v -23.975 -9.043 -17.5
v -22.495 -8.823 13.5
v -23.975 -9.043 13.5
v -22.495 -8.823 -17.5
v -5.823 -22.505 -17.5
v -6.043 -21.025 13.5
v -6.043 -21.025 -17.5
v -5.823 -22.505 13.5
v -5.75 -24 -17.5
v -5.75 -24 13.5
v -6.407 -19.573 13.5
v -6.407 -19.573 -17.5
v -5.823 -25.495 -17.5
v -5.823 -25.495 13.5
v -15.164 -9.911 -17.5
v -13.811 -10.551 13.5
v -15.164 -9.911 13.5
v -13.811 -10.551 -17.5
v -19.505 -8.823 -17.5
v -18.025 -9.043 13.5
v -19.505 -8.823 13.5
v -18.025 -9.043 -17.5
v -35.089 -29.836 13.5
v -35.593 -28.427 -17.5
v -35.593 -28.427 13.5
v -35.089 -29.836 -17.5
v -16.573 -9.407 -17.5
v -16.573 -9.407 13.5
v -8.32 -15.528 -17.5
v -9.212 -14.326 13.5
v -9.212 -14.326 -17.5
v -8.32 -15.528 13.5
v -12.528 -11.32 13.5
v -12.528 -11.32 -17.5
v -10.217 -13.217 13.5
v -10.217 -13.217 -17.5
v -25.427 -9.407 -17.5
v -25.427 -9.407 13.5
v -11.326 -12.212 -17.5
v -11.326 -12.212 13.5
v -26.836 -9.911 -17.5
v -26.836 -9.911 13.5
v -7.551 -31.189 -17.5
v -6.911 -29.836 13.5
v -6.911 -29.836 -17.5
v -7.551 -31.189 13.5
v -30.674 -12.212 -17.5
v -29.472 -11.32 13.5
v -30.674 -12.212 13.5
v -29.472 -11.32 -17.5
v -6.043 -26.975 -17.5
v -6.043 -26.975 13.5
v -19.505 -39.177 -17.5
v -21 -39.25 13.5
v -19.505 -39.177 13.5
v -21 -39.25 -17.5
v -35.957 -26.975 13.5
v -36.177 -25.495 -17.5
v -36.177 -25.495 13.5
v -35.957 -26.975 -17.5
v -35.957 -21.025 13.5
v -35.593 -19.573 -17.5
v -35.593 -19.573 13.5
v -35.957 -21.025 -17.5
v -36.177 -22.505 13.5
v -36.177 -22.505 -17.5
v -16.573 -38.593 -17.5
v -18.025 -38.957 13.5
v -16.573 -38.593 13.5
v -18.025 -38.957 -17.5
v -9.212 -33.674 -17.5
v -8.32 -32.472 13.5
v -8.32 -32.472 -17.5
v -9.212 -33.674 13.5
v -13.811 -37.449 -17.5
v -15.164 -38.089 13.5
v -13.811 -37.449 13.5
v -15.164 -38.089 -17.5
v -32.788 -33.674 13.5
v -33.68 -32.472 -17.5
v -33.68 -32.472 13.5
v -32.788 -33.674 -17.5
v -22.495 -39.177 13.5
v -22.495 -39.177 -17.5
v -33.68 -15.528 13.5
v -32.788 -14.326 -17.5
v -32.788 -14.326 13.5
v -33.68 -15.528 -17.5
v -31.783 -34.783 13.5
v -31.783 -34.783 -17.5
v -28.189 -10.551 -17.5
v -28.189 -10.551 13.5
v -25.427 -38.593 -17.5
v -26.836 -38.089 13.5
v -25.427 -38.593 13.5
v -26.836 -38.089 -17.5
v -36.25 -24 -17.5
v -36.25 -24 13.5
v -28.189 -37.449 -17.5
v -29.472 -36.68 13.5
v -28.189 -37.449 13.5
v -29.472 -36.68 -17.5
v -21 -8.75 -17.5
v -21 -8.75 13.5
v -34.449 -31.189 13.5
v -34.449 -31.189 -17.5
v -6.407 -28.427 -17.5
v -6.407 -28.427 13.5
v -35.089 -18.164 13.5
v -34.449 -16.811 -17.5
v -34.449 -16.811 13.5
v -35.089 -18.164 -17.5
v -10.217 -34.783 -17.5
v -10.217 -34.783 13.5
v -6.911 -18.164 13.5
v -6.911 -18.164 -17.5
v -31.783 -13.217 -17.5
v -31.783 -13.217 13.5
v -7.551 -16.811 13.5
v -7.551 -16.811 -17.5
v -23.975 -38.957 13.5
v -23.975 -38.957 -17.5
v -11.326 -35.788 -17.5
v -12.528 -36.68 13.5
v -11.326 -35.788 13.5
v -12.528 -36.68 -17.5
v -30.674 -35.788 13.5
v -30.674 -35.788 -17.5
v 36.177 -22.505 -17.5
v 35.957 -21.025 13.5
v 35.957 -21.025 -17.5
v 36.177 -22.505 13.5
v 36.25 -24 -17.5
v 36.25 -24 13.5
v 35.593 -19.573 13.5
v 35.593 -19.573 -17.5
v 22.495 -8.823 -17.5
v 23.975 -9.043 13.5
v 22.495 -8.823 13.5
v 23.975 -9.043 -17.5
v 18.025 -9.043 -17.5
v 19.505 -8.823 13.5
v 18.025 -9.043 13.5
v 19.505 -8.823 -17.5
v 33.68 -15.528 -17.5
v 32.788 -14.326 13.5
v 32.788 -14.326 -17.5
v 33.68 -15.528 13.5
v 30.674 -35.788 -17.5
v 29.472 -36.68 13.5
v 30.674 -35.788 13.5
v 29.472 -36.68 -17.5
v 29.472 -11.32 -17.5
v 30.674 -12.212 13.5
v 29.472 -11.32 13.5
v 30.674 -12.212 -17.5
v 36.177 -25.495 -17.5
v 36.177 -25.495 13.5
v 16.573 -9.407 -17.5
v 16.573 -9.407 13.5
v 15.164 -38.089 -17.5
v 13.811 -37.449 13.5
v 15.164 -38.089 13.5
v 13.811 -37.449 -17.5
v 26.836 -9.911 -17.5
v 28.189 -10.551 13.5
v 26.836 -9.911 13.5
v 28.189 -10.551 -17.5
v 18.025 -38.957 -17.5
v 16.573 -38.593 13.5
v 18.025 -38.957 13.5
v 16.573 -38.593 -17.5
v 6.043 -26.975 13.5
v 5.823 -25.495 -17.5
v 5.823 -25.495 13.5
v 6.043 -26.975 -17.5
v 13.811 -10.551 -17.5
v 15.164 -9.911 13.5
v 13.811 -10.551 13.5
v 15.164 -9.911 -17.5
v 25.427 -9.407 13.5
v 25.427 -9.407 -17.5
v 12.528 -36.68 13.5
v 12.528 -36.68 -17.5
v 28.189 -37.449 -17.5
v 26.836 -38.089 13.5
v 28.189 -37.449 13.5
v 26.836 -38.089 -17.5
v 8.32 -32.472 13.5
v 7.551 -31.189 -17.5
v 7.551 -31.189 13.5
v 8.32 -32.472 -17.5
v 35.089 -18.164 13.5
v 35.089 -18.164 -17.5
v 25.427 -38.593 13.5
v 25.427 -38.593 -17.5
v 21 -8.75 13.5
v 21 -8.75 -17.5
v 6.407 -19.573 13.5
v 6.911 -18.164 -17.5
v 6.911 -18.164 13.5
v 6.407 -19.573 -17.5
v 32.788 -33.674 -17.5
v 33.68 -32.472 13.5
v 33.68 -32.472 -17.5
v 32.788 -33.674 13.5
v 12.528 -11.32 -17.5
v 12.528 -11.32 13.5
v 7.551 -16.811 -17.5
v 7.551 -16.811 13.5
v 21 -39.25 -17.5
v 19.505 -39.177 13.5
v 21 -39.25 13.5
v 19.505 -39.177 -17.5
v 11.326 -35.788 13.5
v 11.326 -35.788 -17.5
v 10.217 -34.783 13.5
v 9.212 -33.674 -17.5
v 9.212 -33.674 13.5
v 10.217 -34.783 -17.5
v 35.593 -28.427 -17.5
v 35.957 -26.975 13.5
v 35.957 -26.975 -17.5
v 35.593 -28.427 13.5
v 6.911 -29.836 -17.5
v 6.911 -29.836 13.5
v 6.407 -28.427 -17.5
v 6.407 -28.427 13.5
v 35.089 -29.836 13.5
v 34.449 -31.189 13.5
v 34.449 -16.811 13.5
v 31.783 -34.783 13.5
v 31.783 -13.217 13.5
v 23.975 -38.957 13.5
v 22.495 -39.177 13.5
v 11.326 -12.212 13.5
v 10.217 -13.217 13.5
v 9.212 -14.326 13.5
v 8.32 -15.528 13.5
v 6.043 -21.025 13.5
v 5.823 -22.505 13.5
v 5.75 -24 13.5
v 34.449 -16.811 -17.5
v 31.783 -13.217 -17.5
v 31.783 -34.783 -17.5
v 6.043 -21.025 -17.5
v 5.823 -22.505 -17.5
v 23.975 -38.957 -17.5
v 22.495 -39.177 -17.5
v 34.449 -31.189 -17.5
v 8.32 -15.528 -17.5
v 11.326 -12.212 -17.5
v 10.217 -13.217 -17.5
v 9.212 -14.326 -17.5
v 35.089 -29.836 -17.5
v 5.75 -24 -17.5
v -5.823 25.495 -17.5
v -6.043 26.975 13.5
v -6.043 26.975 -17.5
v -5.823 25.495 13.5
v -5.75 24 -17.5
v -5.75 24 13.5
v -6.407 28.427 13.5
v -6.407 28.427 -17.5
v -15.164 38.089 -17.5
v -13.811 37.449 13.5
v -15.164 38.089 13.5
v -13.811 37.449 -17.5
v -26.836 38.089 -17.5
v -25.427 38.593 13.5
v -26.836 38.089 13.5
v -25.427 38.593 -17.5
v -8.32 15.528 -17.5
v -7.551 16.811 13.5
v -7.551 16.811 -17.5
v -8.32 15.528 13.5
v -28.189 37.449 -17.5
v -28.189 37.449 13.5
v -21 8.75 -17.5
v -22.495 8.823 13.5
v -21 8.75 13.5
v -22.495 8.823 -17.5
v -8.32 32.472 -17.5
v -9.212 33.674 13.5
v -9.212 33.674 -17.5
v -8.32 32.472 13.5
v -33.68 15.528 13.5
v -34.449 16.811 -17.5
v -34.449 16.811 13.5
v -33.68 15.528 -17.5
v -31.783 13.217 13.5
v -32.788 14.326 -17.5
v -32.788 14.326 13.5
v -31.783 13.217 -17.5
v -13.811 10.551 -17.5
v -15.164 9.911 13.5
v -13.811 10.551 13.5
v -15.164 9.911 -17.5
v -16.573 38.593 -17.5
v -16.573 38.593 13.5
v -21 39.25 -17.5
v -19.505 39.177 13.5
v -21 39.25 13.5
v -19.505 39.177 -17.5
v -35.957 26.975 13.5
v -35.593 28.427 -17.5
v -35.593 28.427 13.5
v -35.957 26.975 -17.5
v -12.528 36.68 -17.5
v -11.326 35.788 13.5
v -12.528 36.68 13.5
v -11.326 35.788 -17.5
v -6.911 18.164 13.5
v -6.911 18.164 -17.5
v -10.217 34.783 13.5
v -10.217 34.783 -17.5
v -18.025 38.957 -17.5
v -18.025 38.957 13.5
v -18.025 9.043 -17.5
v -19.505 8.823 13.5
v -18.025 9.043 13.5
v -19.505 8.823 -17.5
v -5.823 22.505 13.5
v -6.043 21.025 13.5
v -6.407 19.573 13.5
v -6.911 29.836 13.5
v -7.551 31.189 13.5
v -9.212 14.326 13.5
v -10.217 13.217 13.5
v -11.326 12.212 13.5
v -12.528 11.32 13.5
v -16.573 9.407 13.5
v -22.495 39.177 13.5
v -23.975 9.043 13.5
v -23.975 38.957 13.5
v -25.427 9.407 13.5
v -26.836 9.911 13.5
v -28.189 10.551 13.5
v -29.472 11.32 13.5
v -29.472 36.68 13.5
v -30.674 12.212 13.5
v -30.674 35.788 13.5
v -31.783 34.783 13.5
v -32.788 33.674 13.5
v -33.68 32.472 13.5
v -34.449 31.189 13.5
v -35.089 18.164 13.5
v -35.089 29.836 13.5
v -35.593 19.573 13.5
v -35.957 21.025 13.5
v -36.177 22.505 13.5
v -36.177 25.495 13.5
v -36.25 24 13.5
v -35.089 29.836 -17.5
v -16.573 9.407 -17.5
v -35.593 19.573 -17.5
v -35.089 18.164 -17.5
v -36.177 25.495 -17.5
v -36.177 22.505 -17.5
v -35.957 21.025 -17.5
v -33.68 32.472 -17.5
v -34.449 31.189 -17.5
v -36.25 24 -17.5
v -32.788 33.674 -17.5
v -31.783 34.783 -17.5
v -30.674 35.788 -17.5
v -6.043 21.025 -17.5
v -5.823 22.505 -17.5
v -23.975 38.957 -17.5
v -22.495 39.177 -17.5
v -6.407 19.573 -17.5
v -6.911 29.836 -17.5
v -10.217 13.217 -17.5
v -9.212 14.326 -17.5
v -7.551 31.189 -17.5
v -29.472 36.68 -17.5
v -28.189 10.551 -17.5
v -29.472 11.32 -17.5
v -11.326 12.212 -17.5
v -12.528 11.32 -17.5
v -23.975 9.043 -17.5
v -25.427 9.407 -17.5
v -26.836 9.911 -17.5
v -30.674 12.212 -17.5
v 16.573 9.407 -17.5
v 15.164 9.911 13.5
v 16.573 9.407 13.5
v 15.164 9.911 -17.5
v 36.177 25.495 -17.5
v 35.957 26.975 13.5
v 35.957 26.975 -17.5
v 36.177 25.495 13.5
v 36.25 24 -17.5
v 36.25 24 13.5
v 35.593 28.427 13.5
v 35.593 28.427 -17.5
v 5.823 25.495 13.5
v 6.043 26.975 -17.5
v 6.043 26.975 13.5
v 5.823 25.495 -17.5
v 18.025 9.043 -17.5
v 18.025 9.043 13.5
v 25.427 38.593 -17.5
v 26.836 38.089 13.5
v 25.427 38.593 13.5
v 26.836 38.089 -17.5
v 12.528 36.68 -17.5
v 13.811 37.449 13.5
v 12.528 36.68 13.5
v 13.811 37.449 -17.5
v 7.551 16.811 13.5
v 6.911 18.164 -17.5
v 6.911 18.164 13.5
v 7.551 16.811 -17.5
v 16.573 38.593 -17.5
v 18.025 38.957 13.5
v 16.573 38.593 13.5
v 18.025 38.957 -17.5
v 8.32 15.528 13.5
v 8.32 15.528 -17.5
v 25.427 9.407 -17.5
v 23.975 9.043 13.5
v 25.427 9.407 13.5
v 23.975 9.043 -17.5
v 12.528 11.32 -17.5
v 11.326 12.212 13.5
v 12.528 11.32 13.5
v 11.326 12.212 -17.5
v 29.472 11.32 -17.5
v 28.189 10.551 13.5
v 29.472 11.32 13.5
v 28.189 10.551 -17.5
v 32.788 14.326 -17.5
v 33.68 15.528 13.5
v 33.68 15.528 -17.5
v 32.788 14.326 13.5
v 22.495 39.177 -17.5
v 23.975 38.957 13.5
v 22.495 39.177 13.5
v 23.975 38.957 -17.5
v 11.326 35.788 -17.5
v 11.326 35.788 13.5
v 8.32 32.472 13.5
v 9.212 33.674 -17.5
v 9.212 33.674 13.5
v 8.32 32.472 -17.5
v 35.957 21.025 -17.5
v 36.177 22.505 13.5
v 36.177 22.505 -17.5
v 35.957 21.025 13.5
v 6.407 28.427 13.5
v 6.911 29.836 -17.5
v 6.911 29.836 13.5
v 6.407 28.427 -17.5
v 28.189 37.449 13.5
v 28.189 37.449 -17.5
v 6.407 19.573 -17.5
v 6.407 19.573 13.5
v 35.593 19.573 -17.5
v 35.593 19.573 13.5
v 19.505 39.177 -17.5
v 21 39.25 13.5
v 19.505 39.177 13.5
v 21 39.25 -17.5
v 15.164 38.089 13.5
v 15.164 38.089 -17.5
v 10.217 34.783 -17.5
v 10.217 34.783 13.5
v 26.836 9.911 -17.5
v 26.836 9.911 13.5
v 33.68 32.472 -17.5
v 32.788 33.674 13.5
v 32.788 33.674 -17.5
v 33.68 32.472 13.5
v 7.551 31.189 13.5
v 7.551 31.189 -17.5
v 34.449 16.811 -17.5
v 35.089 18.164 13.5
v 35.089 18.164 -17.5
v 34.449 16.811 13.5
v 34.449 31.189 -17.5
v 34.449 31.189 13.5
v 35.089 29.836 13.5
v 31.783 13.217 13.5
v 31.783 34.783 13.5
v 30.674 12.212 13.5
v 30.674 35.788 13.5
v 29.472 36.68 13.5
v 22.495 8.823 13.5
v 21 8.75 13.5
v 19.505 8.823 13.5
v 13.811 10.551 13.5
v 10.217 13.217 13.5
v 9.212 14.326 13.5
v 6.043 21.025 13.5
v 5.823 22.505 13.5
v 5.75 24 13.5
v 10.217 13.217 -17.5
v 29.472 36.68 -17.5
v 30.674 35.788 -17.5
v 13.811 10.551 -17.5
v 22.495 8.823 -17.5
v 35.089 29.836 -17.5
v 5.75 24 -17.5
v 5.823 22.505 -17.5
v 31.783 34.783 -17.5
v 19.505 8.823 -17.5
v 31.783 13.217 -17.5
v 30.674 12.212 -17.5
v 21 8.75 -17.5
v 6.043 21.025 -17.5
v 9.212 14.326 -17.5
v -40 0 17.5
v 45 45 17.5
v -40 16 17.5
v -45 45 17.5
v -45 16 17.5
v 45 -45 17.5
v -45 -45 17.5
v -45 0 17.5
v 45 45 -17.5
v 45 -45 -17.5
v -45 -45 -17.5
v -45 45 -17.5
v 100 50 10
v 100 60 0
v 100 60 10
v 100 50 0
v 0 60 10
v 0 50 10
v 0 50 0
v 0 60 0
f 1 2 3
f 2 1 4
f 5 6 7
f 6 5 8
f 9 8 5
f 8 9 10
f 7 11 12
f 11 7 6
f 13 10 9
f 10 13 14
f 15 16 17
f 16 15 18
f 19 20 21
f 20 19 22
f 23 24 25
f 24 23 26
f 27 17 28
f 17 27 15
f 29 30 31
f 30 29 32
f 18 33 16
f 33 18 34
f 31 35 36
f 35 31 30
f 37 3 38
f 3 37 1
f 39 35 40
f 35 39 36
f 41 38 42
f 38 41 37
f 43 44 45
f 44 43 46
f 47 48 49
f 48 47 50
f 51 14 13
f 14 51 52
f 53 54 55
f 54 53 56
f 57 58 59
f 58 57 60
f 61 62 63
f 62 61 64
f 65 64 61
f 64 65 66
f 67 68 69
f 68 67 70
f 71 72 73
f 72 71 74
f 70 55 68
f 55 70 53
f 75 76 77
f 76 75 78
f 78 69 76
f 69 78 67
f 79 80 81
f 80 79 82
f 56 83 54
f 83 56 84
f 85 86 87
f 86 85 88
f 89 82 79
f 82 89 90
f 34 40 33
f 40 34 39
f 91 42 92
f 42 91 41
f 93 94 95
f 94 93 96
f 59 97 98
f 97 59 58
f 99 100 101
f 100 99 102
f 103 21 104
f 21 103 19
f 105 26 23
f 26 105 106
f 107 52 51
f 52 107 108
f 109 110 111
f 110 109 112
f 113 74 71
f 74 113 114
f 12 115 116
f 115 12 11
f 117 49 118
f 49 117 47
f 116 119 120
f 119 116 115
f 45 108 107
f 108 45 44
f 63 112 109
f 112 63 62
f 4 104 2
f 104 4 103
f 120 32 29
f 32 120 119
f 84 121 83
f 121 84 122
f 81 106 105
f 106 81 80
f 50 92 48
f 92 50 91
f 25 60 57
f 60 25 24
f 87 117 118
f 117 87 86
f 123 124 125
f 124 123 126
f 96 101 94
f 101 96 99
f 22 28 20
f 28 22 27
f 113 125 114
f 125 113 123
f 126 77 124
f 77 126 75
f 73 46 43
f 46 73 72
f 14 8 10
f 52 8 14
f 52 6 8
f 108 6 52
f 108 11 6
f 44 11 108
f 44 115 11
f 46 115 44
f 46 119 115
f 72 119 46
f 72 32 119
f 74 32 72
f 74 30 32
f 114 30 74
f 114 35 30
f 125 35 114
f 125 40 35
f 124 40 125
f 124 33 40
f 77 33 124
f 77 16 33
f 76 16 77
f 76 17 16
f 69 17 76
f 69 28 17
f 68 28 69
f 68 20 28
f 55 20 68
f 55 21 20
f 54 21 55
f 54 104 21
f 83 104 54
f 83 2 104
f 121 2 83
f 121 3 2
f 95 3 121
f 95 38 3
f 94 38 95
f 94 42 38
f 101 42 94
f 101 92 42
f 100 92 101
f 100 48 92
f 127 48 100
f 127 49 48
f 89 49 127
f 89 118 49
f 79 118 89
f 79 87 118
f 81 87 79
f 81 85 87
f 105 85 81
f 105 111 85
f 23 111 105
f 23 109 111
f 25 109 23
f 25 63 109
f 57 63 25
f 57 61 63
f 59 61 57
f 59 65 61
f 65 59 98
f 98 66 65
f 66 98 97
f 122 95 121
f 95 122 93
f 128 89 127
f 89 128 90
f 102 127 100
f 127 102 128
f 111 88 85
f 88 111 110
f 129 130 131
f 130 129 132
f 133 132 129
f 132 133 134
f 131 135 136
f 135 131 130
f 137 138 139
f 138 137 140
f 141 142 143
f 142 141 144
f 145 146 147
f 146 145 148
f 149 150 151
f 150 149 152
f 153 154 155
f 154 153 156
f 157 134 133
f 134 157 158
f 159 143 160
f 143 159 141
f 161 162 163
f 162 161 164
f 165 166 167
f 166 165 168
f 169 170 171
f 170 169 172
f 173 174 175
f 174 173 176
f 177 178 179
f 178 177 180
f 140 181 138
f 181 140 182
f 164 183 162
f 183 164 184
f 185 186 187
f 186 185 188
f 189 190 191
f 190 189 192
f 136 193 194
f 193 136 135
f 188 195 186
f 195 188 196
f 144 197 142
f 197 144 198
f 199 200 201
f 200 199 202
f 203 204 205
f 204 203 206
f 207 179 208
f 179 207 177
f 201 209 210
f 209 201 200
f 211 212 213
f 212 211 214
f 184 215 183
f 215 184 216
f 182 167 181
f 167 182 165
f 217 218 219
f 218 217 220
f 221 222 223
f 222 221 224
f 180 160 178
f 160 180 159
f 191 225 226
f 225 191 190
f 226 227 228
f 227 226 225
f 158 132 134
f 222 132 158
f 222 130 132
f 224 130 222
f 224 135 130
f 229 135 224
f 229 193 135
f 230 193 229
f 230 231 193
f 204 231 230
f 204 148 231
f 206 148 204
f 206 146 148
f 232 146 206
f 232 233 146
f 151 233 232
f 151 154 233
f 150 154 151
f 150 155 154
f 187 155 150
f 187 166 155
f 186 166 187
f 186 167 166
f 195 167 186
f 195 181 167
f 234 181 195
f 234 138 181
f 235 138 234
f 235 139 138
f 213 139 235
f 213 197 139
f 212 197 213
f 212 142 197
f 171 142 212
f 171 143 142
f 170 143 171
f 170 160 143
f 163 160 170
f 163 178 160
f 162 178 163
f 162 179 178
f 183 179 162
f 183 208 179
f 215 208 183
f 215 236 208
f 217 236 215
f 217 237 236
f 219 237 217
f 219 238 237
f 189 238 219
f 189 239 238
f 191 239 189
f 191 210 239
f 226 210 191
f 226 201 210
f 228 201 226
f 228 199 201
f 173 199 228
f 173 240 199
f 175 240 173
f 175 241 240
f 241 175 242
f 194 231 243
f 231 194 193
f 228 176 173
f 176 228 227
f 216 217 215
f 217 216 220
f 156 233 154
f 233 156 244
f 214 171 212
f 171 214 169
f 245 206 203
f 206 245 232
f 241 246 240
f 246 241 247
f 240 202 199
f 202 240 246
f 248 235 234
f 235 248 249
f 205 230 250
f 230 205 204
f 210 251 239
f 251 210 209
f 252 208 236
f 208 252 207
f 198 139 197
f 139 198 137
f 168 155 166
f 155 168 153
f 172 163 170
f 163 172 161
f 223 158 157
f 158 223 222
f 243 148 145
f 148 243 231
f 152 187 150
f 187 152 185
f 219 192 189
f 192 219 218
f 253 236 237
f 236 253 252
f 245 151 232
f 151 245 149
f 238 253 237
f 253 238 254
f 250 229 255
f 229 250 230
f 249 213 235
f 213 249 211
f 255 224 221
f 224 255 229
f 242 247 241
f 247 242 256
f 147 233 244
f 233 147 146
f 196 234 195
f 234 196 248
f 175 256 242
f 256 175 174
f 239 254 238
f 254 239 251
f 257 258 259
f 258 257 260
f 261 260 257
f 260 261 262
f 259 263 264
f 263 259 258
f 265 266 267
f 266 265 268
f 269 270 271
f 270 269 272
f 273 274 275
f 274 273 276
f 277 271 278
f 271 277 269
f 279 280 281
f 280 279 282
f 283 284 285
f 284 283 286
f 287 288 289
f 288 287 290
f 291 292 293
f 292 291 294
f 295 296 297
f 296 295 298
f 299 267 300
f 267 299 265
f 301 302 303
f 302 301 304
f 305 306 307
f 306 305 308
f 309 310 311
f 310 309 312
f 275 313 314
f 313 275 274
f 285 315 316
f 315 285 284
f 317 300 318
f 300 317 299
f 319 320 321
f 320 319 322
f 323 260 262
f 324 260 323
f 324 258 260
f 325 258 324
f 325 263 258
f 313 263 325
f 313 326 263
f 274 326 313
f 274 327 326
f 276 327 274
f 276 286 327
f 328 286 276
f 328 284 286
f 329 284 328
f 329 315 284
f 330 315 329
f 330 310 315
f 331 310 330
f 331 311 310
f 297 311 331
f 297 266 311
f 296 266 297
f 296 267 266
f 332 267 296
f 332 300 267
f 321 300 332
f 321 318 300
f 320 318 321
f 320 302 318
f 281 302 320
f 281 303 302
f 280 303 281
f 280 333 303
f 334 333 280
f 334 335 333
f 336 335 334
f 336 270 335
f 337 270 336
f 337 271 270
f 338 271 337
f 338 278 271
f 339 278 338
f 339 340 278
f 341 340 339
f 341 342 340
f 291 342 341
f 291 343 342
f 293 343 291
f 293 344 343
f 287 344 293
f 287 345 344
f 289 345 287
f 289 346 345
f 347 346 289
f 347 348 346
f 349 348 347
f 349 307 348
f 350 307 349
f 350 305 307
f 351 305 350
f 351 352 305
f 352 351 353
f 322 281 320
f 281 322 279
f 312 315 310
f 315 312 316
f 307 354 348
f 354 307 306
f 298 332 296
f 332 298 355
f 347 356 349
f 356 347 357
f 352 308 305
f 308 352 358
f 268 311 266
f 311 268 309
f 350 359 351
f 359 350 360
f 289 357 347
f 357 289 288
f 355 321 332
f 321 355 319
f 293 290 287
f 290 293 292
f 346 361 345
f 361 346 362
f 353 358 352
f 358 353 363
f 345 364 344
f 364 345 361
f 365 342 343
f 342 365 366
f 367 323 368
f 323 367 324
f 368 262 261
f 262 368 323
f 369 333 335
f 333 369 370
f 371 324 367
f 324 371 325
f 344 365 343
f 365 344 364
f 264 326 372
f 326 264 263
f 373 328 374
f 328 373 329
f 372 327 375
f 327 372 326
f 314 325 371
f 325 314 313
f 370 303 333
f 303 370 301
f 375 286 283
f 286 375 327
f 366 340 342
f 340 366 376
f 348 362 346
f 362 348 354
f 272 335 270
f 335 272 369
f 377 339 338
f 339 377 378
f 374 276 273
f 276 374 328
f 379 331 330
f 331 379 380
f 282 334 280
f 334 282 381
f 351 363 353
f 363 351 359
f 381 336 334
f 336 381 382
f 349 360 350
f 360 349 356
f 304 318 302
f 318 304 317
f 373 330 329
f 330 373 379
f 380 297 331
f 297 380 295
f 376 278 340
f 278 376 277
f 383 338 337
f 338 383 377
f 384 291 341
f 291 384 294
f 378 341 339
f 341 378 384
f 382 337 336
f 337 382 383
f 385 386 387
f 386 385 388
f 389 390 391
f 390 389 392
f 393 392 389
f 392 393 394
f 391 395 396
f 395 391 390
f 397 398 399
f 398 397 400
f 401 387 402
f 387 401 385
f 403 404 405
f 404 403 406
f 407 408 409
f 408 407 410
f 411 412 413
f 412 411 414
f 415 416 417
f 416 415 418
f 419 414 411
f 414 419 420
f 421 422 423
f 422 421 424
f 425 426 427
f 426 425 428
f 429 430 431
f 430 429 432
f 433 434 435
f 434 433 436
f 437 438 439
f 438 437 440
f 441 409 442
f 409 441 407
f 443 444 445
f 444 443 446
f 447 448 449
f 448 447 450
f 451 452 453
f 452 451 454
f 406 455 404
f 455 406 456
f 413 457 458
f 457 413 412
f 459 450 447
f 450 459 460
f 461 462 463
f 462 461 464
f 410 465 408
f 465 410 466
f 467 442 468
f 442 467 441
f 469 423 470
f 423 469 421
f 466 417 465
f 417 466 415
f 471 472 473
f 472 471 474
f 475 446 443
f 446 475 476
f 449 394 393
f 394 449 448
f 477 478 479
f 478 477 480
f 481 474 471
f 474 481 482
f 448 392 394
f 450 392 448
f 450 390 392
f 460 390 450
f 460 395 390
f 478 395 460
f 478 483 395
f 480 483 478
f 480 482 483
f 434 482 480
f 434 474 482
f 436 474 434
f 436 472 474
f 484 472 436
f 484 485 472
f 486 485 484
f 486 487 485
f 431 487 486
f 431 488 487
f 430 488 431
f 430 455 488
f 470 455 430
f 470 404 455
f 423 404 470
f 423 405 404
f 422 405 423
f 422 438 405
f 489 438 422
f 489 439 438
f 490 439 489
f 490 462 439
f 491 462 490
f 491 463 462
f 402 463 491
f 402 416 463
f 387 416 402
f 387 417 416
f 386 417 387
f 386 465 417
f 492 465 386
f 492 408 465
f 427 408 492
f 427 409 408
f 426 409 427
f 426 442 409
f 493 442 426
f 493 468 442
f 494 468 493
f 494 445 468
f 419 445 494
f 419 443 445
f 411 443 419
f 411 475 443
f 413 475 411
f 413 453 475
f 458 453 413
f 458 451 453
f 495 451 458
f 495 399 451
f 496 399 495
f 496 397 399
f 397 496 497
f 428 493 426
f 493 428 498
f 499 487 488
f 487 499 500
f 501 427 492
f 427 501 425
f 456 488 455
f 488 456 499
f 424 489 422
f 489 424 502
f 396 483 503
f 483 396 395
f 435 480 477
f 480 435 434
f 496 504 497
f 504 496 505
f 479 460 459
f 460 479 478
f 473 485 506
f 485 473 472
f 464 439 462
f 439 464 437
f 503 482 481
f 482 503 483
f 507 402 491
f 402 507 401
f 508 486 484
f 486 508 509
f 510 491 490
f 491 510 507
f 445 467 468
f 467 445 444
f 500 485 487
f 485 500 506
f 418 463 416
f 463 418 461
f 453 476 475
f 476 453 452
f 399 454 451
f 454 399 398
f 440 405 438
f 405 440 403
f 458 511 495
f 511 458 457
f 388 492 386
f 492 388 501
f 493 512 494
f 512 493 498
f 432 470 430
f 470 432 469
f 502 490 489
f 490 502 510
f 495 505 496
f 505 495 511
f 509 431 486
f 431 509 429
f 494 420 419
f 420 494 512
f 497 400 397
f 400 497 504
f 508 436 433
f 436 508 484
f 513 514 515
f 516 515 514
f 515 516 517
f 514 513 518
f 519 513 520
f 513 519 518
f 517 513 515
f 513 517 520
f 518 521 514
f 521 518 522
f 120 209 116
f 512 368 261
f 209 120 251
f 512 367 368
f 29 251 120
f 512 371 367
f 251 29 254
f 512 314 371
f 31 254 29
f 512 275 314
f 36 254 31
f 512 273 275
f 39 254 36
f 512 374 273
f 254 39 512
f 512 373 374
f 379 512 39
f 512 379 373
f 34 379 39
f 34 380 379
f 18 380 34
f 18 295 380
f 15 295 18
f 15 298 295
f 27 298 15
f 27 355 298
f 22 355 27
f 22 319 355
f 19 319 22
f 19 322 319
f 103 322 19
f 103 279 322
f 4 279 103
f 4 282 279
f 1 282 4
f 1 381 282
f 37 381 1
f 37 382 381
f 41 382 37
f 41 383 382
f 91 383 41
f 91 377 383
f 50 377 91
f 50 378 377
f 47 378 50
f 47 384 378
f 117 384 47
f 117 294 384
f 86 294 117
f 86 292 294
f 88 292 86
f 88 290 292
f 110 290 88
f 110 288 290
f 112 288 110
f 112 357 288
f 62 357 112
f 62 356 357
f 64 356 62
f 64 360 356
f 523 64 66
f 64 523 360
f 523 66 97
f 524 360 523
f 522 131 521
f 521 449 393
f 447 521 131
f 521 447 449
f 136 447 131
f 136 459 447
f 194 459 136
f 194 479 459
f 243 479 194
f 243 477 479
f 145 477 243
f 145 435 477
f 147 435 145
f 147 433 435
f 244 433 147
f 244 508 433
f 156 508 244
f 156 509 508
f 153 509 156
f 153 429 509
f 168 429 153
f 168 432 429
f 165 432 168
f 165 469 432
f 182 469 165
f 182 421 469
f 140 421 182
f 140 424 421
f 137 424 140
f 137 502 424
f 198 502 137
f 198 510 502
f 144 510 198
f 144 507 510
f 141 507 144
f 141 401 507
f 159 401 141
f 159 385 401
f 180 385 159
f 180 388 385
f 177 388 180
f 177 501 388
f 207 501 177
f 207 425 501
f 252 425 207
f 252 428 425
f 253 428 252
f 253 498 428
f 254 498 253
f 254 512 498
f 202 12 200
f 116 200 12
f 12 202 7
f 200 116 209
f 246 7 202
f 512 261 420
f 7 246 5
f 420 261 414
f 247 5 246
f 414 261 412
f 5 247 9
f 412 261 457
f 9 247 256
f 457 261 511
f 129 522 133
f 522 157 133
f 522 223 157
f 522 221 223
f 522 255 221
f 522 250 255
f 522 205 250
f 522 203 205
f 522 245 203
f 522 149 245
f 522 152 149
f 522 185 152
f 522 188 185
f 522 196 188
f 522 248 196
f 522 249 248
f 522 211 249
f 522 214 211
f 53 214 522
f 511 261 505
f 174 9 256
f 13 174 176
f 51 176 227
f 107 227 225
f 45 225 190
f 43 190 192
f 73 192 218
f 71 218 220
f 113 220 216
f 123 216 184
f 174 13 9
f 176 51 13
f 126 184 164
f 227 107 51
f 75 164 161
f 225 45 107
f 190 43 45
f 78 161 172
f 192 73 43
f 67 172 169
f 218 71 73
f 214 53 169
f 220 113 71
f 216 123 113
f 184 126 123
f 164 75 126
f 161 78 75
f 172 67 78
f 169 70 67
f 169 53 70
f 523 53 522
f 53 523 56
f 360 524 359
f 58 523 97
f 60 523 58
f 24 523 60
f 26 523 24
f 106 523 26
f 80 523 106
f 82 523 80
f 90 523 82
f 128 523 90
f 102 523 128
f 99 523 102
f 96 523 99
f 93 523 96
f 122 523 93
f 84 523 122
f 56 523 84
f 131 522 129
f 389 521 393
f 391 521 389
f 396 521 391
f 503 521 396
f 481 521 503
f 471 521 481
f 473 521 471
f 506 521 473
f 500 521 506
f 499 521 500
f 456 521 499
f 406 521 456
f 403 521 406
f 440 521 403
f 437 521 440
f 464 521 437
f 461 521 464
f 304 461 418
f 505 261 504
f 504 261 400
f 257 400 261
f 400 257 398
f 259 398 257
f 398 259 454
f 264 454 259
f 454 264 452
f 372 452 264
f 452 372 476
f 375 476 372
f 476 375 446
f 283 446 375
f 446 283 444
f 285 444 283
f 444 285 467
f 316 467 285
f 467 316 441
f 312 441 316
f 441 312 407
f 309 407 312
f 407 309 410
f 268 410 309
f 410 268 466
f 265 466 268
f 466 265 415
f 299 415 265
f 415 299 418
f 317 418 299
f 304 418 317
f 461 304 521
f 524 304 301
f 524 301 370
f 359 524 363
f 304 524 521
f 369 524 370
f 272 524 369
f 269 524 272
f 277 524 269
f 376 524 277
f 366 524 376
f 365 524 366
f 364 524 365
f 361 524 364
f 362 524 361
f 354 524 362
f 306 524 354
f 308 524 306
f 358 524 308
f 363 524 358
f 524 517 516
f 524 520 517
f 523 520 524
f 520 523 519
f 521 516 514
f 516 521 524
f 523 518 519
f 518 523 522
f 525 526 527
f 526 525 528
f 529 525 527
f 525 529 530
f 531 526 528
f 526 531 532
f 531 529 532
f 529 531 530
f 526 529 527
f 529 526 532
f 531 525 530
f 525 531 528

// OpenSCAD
// --- Dimensions for Part 1: Base Block and Posts ---

// Base block dimensions
base_size_x = 90; // mm
base_size_y = 90; // mm
base_height = 35; // mm

// Tube seat dimensions
tube_diameter = 30.5; // mm
tube_depth = 30; // mm
floor_thickness = 5; // mm

// Tube seat positions (relative to center)
seat_x1 = -21; // mm
seat_x2 = 21;  // mm
seat_y1 = -24; // mm
seat_y2 = 24;  // mm

// Post dimensions
post_thickness_x = 10; // mm (X dimension)
post_width_y = 16;    // mm (Y dimension)
post_height = 160;    // mm
hole_size = 10.4;     // mm
hole_diameter = 10.4; // mm

// Post hole position (centered along X, at Z=150)
hole_z_center = 150; // mm

// --- Dimensions for Part 2: Handle ---

handle_width = 10;  // mm
handle_height = 10; // mm
handle_length = 100; // mm

// Handle placement relative to base (+Y face)
// Base max Y is 90/2 = 45. Gap of 10mm means handle starts at Y=55.
handle_gap_y = 10; // mm (Gap from +Y face of base, which is at Y=45)
handle_center_x = 0; // mm

// --- Global Settings ---
$fn = 64;

// ======================================================================
// PART 1: BASE BLOCK AND POSTS
// ======================================================================

module part1() {
    difference() {
        // 1. Base Block (Solid) - Centered on origin, Z=0 to Z=35
        cube([base_size_x, base_size_y, base_height], center = true);

        // 2. Tube Seat Cutouts (4 holes)
        // The floor is at Z = -floor_thickness/2 = -2.5 if centered on Z=0.
        // Since the base block starts at Z=-17.5 and ends at Z=17.5, the bottom face is at Z=-17.5.
        // We want a 5mm floor (Z from -17.5 to -12.5). The cut must go through this.
        // Cut starts slightly below the base bottom (-18.0) and goes deep enough.
        translate([0, 0, -base_height/2 - 1]) { // Start cutting below the lowest point of the block
            for (i = [1:4]) {
                if (i == 1) { // Seat 1: (-X, -Y)
                    // Center at Z=0 relative to the cut origin. Tube depth is 30mm.
                    translate([seat_x1, seat_y1, 0])
                        cylinder(h = tube_depth + 2, r = tube_diameter / 2); // Extend slightly past floor/base
                } else if (i == 2) { // Seat 2: (+X, -Y)
                    translate([seat_x2, seat_y1, 0])
                        cylinder(h = tube_depth + 2, r = tube_diameter / 2);
                } else if (i == 3) { // Seat 3: (-X, +Y)
                    translate([seat_x1, seat_y2, 0])
                        cylinder(h = tube_depth + 2, r = tube_diameter / 2);
                } else { // Seat 4: (+X, +Y)
                    translate([seat_x2, seat_y2, 0])
                        cylinder(h = tube_depth + 2, r = tube_diameter / 2);
                }
            }
        }

        // 3. Posts (Two posts on X ends)
        // The base block is centered at Z=0 and has height 35mm (-17.5 to 17.5).
        // Posts rise from the top face of the base (Z = 17.5) up to Z = 17.5 + 160 = 177.5.
        // Since we are centering everything on origin, the posts must be centered vertically around Z=0 for simplicity in modeling,
        // but they must sit flush on the base top (Z=17.5).

        // Post 1: Left side (-X end)
        translate([-base_size_x/2 - post_thickness_x/2, 0, base_height/2]) { // Start at Z = 17.5
            cube([post_thickness_x, post_width_y, post_height]);

            // Hole through Post 1 (along X axis)
            // The hole is centered at Z=150 relative to the base center (Z=0).
            translate([hole_diameter/2 + 0.01, 0, hole_z_center - base_height/2]) { // Adjust Z offset: 150 - 17.5 = 132.5 from post bottom
                cube([hole_size - 0.02, post_width_y + 0.02, post_height]);
            }
        }

        // Post 2: Right side (+X end)
        translate([base_size_x/2 + post_thickness_x/2, 0, base_height/2]) { // Start at Z = 17.5
            cube([post_thickness_x, post_width_y, post_height]);

            // Hole through Post 2 (along X axis)
            translate([-hole_diameter/2 - 0.01, 0, hole_z_center - base_height/2]) { // Adjust Z offset: 150 - 17.5 = 132.5 from post bottom
                cube([hole_size - 0.02, post_width_y + 0.02, post_height]);
            }
        }

    }
}


// ======================================================================
// PART 2: HANDLE
// ======================================================================

module part2() {
    // Base max Y is base_size_y / 2 = 45 mm.
    // Handle starts at Y = 45 + handle_gap_y = 55 mm.
    // The handle must be centered on X=0, and its length is 100mm (X direction).

    translate([handle_center_x, base_size_y/2 + handle_gap_y - handle_height/2, 0]) {
        cube([handle_length, handle_height, handle_width]);
    }
}


// ======================================================================
// FINAL ASSEMBLY (Rendered as two separate parts)
// ======================================================================

// Render Part 1: Base Block and Posts
color("gray") {
    part1();
}

// Render Part 2: Handle
color("blue") {
    part2();
}
